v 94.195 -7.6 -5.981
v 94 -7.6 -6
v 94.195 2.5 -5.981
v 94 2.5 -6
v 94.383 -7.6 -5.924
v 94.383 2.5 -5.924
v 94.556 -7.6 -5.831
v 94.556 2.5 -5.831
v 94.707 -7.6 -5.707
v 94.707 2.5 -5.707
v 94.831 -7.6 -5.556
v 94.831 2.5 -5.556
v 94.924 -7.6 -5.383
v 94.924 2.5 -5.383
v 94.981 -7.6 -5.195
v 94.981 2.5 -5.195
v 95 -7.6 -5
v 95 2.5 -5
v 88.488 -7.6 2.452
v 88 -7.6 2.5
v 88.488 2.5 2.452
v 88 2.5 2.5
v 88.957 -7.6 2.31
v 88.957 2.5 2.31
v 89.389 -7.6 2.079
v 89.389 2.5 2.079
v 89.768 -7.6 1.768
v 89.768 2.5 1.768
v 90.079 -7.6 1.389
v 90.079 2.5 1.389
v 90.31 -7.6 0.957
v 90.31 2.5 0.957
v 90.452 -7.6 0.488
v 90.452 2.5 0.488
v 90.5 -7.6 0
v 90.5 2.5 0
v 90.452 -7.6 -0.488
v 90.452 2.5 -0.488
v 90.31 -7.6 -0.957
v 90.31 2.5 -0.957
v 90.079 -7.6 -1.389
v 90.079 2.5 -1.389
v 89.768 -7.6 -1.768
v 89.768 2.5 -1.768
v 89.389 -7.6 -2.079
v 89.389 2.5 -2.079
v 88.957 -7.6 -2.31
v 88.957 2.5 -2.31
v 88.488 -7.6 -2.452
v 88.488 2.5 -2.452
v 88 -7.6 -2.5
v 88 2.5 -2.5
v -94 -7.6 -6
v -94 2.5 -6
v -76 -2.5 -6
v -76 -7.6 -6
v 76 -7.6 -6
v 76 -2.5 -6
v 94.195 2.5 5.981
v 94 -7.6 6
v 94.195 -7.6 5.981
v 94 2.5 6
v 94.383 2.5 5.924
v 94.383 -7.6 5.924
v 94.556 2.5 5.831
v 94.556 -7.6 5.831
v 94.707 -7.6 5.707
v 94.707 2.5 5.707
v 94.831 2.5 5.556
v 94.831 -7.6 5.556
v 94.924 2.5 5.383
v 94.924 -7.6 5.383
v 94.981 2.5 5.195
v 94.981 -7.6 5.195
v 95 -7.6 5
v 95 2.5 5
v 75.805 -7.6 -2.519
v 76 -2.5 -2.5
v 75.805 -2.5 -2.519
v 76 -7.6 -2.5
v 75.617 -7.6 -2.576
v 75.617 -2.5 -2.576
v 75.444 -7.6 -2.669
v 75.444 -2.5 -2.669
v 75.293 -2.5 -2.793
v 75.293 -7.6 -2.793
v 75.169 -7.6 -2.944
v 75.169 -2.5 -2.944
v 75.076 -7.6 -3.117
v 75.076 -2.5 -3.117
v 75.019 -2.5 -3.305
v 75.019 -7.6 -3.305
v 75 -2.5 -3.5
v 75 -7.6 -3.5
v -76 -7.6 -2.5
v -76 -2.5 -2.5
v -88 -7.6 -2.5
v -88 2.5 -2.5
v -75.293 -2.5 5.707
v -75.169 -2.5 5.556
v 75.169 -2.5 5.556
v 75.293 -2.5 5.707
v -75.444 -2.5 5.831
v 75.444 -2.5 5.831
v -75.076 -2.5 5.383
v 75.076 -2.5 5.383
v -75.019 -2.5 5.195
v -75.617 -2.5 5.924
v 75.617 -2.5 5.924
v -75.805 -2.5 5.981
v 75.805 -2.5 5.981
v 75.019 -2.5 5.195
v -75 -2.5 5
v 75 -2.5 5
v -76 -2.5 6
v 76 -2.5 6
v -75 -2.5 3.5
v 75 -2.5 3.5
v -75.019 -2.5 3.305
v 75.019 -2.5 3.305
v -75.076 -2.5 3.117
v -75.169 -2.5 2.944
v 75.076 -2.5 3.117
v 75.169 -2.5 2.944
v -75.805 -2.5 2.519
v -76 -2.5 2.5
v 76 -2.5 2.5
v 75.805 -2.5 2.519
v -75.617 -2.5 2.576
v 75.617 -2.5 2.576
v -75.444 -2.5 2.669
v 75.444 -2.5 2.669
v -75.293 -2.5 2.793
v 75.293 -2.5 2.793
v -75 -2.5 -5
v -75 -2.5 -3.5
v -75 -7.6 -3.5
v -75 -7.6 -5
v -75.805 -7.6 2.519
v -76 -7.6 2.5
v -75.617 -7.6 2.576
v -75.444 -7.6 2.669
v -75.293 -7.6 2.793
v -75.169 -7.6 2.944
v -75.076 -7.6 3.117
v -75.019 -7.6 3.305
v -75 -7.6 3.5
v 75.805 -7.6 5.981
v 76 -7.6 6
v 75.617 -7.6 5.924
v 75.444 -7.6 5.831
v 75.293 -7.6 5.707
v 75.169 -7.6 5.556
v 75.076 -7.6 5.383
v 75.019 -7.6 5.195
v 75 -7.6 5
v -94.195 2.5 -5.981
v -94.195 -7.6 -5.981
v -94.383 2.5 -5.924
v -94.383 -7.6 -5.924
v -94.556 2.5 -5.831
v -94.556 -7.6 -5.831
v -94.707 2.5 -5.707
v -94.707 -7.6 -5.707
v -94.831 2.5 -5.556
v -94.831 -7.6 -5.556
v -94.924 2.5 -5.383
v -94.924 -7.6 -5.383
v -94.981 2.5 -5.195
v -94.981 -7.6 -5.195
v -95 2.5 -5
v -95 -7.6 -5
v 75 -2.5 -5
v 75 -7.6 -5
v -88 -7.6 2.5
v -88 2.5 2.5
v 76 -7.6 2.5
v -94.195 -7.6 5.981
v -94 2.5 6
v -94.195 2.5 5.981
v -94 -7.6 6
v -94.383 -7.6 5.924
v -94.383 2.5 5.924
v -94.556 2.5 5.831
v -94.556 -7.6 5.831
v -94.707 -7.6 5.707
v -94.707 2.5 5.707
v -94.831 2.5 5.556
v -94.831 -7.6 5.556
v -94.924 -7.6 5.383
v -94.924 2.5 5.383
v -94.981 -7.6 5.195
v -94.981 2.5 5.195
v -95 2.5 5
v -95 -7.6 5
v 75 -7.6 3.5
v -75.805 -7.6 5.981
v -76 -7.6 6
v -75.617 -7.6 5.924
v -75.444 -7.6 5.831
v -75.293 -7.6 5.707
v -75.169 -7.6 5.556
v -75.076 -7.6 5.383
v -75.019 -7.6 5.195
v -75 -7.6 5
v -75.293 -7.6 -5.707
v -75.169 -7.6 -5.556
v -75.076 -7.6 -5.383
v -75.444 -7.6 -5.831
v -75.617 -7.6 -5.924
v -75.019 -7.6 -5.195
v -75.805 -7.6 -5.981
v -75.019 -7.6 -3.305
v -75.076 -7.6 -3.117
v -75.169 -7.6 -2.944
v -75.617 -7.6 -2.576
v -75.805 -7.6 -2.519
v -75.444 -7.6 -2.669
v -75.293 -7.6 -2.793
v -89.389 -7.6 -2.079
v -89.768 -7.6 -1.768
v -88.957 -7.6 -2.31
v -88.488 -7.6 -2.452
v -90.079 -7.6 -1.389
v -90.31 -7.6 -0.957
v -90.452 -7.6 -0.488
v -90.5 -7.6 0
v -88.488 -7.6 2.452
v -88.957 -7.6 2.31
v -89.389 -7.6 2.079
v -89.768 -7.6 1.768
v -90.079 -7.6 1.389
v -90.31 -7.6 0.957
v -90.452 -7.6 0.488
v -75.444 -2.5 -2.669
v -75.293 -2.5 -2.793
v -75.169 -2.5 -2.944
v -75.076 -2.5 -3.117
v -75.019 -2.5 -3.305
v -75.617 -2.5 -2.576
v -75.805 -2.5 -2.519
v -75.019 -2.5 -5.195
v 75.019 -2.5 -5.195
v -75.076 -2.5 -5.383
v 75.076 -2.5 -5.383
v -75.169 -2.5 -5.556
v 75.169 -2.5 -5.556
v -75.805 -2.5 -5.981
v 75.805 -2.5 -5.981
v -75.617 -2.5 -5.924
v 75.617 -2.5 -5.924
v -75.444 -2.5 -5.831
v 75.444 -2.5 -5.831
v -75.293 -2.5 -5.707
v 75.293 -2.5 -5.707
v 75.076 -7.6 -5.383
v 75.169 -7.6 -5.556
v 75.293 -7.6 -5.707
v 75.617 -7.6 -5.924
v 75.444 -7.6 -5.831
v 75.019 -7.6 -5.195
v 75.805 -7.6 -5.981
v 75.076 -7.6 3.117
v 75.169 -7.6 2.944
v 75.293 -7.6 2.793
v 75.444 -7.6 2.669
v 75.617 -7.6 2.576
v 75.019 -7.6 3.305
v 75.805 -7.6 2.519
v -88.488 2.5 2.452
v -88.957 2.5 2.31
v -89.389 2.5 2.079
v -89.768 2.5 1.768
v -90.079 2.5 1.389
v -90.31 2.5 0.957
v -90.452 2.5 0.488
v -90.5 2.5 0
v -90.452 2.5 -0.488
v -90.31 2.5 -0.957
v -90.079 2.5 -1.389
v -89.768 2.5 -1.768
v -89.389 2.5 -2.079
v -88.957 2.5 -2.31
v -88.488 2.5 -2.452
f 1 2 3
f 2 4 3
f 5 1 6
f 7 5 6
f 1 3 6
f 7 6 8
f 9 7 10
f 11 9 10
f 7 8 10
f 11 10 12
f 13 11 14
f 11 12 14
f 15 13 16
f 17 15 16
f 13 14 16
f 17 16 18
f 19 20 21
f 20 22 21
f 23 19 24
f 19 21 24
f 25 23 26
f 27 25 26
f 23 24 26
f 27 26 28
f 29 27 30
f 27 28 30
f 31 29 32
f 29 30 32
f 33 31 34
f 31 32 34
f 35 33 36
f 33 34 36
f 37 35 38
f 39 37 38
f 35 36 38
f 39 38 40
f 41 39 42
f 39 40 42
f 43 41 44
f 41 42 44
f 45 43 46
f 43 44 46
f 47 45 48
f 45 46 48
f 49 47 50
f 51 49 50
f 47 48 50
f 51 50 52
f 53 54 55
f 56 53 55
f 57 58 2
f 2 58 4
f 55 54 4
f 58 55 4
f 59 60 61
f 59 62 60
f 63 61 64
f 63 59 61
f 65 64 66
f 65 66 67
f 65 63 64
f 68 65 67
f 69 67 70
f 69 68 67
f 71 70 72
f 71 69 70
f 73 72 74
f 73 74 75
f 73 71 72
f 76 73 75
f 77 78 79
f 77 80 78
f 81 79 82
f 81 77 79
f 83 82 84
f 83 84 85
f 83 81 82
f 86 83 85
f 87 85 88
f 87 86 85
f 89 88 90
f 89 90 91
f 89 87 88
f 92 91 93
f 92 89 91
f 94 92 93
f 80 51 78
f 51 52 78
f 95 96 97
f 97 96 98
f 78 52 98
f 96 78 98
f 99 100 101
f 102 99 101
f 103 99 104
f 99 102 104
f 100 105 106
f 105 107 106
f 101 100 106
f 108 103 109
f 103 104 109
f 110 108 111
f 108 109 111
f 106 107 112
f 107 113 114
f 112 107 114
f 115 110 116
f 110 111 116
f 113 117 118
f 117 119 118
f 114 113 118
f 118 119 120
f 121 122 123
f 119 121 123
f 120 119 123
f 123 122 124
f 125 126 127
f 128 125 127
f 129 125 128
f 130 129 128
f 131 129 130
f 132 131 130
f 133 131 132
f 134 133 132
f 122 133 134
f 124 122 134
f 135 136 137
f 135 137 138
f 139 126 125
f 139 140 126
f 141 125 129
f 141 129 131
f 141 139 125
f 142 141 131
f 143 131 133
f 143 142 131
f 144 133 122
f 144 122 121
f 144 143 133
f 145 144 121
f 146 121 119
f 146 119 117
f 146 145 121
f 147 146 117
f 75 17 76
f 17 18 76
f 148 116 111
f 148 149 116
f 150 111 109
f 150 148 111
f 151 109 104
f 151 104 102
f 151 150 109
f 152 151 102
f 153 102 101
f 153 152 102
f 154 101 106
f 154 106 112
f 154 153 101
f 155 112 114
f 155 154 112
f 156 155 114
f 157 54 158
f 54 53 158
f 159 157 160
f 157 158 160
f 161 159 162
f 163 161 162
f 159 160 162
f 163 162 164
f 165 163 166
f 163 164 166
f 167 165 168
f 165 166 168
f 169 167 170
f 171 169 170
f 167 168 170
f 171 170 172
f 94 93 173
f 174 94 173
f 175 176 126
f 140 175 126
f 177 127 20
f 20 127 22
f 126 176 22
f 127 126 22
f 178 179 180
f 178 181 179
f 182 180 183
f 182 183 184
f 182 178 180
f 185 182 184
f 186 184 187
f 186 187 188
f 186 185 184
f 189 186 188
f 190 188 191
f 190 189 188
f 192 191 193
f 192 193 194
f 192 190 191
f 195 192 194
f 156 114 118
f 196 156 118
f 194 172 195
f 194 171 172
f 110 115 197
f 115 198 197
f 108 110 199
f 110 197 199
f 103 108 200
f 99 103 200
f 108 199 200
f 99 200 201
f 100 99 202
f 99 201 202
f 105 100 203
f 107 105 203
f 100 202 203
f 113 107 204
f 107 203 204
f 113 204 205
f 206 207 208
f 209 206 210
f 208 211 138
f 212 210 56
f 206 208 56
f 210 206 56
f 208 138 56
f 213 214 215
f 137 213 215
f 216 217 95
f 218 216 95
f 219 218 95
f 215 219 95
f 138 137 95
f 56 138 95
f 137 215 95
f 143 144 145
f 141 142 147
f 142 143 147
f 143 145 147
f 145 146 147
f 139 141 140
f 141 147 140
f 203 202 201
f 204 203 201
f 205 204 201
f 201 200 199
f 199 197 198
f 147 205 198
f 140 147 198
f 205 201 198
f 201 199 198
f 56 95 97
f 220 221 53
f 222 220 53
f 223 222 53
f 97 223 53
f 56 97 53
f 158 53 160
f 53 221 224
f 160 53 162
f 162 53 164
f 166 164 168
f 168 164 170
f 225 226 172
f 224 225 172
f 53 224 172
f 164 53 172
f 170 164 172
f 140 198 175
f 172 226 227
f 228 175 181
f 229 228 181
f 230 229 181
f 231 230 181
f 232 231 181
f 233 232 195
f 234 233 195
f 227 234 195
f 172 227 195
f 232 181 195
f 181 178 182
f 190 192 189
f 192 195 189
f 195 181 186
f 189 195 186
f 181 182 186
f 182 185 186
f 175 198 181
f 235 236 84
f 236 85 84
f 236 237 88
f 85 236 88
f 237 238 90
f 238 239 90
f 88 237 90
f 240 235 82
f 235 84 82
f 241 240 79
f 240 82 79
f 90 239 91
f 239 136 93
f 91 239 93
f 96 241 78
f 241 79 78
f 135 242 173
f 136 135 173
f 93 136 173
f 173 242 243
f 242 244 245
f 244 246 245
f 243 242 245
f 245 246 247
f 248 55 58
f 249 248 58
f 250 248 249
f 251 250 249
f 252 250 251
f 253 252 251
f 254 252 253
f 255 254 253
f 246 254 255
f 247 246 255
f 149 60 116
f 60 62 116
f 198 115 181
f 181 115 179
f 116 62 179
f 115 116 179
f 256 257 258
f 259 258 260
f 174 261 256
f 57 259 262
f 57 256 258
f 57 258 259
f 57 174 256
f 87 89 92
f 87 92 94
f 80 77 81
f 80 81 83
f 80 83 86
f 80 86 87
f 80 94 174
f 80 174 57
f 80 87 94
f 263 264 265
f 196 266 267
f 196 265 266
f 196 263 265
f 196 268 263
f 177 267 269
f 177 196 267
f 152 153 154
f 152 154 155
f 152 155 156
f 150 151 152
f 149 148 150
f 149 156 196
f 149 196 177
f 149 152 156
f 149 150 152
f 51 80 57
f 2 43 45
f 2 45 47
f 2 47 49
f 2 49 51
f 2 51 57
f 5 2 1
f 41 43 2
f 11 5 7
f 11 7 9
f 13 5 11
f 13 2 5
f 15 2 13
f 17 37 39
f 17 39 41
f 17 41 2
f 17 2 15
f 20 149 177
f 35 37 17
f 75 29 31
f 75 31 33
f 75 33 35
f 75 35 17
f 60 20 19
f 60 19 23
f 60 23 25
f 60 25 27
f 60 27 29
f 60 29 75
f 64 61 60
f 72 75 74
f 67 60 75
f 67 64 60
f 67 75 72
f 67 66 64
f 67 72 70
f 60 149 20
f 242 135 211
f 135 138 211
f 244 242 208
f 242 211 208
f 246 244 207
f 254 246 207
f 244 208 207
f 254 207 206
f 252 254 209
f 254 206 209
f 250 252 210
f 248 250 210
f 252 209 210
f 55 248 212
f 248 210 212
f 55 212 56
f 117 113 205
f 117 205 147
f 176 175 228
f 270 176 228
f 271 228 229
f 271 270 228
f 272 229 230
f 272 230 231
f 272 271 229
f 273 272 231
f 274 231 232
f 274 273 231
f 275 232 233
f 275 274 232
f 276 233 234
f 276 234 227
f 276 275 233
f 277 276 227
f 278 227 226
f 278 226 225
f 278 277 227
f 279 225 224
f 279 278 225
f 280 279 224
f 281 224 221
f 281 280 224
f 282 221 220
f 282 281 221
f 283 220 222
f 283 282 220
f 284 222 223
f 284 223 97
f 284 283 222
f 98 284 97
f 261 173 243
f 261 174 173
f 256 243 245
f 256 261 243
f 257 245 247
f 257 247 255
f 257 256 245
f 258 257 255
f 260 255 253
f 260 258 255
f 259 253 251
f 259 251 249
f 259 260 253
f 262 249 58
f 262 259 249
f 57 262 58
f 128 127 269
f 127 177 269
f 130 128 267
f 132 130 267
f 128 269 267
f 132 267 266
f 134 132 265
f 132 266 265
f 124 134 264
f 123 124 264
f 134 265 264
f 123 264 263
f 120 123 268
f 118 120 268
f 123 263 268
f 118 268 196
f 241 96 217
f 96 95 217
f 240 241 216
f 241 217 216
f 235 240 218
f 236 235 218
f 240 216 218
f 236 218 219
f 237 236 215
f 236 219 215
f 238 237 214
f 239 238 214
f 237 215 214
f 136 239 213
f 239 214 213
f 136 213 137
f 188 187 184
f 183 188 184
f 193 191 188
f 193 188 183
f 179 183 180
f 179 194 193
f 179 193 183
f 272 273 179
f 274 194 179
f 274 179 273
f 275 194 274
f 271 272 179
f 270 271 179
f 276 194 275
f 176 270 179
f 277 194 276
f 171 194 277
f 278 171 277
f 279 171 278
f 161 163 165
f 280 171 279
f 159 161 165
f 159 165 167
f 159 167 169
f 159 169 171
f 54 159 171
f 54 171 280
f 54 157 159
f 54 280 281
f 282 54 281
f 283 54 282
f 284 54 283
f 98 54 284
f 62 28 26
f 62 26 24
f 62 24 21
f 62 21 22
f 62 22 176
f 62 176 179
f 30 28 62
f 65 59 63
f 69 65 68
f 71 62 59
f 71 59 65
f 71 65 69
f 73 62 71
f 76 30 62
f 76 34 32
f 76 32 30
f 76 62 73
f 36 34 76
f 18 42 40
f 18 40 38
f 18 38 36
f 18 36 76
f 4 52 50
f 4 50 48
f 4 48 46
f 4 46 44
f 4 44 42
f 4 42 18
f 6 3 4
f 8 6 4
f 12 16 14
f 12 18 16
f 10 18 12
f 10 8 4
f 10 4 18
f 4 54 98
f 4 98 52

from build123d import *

# Parameters (mm, degrees)
ESQUISSE1_W        = 190
ESQUISSE1_H        = 12
BOSS_EXTRU_1_DEPTH = 2.5
BOSS_EXTRU_3_DEPTH = 5.1
CONG_1_R           = 1


with BuildPart() as part:
    # Esquisse1 → Boss.-Extru.1 (new body, symmetric)
    with BuildSketch(Plane(origin=(0, 0, 0), x_dir=(1, 0, 0), z_dir=(0, 1, 0))):
        Rectangle(ESQUISSE1_W, ESQUISSE1_H)
        with BuildLine():
            Line((-88, 2.5), (88, 2.5))
            ThreePointArc((88, 2.5), (90.5, 0), (88, -2.5))
            Line((88, -2.5), (-88, -2.5))
            ThreePointArc((-88, -2.5), (-90.5, 0), (-88, 2.5))
        make_face(mode=Mode.SUBTRACT)
    extrude(amount=BOSS_EXTRU_1_DEPTH, both=True)

    # Esquisse4 → Boss.-Extru.3 (add)
    with BuildSketch(Plane.XZ.offset(2.5)):
        with BuildLine():
            Line((-95, 6), (-75, 6))
            Line((-75, 6), (-75, 2.5))
            Line((-75, 2.5), (-88, 2.5))
            ThreePointArc((-88, 2.5), (-90.5, 0), (-88, -2.5))
            Line((-88, -2.5), (-75, -2.5))
            Line((-75, -2.5), (-75, -6))
            Line((-75, -6), (-95, -6))
            Line((-95, -6), (-95, 6))
        make_face()
    boss_extru_3 = extrude(amount=BOSS_EXTRU_3_DEPTH)

    # Symétrie2: Boss.-Extru.3 across plane
    add(boss_extru_3.mirror(Plane(origin=(0, 0, 0), x_dir=(0, 0, 1), z_dir=(1, 0, 0))))

    # Congé1
    cong_1_edges = [part.edges().sort_by_distance(p)[0] for p in [
        (-75, -5.05, -6),
        (-75, -5.05, -2.5),
        (-75, -5.05, 2.5),
        (-75, -5.05, 6),
        (75, -5.05, 6),
        (75, -5.05, 2.5),
        (75, -5.05, -2.5),
        (75, -5.05, -6),
        (95, -2.55, 6),
        (-95, -2.55, 6),
        (-95, -2.55, -6),
        (95, -2.55, -6),
    ]]
    fillet(cong_1_edges, radius=CONG_1_R)


solid = part.part
